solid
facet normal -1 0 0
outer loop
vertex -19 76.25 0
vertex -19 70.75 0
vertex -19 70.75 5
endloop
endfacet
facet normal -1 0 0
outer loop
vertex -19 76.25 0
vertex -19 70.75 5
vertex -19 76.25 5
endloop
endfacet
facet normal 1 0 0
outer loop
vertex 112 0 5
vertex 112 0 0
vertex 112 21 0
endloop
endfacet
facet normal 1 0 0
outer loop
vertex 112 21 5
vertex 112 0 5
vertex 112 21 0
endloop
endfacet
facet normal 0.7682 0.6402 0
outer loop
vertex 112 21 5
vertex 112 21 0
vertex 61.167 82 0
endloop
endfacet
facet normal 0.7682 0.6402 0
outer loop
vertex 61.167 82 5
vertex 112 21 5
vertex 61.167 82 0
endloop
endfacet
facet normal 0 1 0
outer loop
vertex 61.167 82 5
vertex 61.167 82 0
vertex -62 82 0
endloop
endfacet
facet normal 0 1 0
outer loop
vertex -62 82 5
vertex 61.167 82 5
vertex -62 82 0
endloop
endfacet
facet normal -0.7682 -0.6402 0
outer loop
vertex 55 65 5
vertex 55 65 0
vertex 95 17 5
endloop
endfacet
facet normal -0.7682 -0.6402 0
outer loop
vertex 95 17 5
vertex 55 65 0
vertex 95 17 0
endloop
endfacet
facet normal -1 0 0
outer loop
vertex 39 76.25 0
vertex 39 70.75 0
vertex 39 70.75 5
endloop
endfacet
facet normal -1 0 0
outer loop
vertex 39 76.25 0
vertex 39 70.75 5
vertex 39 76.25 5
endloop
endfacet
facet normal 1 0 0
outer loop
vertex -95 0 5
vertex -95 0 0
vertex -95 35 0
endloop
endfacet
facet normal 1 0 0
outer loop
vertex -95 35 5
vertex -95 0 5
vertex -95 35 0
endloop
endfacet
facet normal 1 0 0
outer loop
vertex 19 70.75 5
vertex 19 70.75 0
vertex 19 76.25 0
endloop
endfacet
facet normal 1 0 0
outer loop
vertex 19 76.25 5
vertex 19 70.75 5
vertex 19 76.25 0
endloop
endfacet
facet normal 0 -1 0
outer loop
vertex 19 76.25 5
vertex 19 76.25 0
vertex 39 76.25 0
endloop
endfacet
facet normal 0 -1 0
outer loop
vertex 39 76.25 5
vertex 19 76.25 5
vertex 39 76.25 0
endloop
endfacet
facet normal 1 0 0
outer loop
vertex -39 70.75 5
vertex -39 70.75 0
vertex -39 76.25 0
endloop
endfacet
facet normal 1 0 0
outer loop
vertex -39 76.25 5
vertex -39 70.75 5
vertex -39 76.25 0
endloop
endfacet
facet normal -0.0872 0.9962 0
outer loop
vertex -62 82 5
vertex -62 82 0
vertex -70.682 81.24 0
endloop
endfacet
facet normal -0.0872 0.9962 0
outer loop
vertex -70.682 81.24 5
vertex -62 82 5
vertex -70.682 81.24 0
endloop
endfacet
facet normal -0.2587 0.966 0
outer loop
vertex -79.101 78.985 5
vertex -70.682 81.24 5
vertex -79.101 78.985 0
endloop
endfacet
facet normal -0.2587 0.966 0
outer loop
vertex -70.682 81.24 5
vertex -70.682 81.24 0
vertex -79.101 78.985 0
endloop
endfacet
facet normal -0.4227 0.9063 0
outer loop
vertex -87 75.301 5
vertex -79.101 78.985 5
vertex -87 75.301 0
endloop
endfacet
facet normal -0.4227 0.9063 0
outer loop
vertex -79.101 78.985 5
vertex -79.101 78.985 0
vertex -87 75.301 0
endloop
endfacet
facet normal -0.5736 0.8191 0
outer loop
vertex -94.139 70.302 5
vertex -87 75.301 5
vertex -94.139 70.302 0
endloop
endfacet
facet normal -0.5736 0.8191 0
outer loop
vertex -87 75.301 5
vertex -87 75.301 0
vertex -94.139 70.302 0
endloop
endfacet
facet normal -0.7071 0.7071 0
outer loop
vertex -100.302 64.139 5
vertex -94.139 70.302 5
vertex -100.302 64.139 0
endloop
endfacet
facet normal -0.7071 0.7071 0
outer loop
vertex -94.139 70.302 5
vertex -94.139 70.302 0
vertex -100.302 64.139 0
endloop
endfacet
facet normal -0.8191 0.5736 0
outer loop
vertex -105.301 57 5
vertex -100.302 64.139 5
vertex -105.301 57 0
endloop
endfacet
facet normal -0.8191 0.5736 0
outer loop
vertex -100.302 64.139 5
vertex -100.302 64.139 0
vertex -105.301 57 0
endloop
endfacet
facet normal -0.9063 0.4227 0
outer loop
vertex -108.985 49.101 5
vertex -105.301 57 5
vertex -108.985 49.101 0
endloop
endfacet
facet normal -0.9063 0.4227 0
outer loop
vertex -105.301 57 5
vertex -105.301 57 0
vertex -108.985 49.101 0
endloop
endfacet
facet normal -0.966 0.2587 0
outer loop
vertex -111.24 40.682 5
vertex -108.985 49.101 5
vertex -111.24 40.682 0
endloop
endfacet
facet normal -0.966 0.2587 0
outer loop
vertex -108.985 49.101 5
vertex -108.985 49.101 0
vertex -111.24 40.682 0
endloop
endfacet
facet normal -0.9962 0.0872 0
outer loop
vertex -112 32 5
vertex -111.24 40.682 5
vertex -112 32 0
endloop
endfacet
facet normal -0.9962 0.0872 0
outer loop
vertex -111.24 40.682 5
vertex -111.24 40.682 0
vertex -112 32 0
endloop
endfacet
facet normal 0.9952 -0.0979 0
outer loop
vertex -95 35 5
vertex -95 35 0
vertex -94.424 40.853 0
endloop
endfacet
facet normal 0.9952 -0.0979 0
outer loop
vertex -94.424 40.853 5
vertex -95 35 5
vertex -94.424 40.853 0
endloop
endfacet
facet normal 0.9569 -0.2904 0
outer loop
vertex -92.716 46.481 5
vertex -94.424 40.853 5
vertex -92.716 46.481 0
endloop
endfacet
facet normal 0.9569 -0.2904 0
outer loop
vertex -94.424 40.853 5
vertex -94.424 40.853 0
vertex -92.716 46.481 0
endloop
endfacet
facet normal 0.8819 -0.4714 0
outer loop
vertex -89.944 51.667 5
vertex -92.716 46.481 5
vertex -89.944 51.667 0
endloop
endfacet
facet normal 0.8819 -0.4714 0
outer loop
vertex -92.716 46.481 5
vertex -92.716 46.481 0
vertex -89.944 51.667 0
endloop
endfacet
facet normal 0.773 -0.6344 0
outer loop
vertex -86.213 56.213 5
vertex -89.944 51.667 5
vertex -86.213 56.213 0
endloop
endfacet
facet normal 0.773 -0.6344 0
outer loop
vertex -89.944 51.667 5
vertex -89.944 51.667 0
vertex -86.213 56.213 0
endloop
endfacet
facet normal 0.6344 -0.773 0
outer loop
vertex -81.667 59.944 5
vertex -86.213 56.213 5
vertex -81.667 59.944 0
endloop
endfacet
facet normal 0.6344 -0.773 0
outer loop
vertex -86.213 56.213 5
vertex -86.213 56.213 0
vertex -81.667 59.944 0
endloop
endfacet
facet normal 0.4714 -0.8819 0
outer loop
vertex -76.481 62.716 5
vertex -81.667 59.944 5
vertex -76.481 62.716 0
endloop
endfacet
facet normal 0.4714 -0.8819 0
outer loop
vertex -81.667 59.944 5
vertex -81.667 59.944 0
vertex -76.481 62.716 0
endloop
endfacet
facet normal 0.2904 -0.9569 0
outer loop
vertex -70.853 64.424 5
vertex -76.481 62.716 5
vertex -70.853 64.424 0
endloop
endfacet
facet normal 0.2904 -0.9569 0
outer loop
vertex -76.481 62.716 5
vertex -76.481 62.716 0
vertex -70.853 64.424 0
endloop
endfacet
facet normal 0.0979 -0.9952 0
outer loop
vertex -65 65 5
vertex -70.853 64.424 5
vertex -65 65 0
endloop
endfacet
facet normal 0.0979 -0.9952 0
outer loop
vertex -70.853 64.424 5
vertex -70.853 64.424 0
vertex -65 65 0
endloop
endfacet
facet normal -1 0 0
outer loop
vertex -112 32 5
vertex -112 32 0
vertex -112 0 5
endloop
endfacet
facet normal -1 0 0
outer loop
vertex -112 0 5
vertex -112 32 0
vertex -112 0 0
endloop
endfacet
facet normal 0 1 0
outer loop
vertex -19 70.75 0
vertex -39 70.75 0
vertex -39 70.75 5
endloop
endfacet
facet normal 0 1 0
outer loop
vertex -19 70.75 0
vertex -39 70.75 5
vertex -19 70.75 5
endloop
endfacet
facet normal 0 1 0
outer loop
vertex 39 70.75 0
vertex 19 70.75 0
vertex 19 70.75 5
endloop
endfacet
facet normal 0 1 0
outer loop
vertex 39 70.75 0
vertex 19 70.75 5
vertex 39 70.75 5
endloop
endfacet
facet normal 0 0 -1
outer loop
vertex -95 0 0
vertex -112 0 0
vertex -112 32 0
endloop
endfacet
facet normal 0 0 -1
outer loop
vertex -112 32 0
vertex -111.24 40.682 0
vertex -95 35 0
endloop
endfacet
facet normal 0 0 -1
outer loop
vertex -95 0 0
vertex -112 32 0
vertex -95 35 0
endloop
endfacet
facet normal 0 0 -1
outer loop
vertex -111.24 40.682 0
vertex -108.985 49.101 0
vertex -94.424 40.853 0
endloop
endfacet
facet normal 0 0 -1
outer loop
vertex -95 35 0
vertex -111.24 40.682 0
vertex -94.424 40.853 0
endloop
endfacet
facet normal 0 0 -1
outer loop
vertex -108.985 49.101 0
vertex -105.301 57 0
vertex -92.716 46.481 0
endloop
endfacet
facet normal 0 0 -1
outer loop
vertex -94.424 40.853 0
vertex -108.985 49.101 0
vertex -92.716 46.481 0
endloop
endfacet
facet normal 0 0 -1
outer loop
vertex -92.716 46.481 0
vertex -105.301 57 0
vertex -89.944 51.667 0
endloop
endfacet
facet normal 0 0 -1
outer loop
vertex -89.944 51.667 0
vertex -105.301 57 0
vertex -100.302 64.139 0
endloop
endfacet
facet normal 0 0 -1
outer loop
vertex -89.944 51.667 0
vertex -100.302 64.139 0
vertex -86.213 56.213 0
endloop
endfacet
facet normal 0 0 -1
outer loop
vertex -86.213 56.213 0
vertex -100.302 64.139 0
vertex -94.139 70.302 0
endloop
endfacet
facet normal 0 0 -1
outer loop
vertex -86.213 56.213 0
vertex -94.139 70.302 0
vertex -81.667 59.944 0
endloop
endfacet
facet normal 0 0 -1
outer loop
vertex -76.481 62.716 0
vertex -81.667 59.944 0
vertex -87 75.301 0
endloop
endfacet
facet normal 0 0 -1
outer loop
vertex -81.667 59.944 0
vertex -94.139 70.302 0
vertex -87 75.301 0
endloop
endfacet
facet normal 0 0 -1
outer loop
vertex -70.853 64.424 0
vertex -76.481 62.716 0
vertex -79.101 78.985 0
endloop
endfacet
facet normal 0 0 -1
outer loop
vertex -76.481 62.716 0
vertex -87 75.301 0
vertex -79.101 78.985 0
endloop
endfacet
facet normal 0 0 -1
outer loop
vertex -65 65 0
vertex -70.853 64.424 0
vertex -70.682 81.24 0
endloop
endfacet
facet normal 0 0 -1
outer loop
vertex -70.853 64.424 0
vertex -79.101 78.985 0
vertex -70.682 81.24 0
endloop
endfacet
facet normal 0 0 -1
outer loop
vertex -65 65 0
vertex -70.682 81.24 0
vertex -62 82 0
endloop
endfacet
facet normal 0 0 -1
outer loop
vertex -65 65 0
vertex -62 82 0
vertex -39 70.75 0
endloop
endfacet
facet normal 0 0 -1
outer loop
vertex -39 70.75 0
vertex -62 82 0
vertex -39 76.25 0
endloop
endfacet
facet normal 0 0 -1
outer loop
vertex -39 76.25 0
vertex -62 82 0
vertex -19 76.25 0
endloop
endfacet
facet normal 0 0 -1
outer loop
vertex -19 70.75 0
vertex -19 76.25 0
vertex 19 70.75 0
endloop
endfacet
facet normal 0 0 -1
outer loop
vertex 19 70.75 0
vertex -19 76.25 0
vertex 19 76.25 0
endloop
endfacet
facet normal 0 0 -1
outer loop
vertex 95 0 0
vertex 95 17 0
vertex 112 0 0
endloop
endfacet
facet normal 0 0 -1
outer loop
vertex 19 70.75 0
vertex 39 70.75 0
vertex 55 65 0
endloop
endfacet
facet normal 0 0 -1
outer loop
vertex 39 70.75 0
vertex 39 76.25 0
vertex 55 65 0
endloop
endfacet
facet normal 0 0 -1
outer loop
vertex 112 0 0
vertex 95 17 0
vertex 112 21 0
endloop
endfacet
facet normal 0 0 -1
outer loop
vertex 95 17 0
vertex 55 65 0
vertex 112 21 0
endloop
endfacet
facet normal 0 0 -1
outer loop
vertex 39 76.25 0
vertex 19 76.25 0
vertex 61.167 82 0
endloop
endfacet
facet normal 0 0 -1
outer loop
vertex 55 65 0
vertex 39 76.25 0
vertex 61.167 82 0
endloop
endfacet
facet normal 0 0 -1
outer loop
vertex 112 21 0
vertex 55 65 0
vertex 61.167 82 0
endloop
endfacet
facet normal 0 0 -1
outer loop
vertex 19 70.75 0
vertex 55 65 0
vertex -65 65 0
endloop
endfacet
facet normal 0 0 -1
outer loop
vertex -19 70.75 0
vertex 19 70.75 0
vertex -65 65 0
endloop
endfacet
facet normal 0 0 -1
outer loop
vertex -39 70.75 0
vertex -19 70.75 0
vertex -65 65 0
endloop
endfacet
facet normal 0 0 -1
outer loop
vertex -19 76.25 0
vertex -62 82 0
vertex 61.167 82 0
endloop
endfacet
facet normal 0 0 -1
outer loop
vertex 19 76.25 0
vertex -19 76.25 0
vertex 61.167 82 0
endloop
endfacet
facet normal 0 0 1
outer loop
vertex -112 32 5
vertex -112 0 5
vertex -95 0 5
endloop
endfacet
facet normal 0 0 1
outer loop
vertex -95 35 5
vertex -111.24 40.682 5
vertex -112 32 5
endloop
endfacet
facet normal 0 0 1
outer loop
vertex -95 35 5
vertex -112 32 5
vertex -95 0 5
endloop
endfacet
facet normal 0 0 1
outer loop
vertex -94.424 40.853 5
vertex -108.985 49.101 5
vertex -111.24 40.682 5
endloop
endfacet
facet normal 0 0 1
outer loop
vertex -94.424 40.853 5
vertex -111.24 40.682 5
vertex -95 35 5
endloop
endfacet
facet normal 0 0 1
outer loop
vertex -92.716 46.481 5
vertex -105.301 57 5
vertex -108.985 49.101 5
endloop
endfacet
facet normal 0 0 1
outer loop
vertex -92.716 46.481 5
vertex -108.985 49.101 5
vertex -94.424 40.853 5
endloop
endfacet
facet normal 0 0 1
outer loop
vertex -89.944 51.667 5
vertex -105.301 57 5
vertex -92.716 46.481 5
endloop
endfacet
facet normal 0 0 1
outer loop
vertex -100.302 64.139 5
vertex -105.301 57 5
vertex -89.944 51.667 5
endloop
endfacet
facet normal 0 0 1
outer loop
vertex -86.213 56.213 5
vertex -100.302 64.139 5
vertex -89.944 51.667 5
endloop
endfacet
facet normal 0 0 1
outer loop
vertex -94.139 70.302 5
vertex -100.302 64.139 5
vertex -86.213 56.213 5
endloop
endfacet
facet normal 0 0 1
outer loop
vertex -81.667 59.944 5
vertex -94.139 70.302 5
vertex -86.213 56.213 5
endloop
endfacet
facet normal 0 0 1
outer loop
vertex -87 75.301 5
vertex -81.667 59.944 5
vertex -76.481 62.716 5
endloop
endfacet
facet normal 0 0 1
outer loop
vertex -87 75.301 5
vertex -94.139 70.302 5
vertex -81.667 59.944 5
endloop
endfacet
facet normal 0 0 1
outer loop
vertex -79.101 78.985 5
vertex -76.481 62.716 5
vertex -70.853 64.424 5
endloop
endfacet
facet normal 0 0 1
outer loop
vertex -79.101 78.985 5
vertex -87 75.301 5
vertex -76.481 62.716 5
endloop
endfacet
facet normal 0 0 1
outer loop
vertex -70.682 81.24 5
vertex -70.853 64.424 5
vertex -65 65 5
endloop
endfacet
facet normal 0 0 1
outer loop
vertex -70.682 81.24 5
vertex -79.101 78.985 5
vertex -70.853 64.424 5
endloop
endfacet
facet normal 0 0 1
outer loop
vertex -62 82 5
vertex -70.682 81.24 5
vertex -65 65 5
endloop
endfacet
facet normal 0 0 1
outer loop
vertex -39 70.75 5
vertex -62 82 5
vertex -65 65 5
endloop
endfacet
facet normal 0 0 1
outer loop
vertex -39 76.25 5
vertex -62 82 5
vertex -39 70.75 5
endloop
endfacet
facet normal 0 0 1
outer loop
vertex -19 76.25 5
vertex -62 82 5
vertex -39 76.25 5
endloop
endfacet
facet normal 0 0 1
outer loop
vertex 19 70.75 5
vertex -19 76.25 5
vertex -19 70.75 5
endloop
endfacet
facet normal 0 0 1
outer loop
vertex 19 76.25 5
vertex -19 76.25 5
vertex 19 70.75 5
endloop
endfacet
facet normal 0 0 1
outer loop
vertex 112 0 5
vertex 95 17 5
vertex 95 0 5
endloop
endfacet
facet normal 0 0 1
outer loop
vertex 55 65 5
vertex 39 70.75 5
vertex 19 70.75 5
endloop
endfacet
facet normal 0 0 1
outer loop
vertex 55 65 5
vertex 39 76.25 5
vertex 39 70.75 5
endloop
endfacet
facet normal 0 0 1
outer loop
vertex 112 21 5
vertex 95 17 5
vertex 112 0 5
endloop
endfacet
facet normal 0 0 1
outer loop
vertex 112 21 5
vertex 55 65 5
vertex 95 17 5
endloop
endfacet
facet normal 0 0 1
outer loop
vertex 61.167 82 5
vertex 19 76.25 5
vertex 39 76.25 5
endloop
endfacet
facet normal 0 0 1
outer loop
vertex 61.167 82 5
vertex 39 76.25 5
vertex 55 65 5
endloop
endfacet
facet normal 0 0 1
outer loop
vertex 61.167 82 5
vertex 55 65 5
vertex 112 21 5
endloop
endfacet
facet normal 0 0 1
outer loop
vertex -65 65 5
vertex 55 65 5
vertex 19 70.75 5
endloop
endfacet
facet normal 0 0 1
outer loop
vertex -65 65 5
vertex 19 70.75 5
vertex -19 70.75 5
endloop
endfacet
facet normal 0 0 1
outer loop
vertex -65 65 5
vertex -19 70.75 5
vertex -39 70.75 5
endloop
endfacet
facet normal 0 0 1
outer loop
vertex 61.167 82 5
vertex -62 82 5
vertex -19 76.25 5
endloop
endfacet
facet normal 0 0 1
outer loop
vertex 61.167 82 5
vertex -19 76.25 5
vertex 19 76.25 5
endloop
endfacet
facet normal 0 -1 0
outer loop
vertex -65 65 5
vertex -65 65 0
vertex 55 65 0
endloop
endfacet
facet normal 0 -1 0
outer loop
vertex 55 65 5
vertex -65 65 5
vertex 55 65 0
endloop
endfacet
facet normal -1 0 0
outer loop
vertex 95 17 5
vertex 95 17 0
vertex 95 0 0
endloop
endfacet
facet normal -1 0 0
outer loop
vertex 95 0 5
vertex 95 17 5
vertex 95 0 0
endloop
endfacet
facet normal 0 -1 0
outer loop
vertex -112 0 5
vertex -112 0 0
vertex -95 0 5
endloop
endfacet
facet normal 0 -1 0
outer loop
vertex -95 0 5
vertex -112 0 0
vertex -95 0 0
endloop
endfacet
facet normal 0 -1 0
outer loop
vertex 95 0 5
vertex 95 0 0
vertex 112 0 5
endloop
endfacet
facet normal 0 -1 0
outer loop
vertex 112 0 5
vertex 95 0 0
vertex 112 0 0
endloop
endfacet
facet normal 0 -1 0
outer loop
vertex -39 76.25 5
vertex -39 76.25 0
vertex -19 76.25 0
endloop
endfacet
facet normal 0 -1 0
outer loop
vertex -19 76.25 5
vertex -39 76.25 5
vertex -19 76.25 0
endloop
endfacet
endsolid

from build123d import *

# Parameters (mm, degrees)
SKETCH1_W           = 20
SKETCH1_H           = 5.5
BOSS_EXTRUDE1_DEPTH = 5


with BuildPart() as part:
    # Sketch1 → Boss-Extrude1 (new body)
    with BuildSketch(Plane.XY):
        with BuildLine():
            Line((-112, 0), (-95, 0))
            Line((-95, 0), (-95, 17))
            Line((-95, 17), (-95, 35))
            ThreePointArc((-95, 35), (-86.213203436, 56.213203436), (-65, 65))
            Line((-65, 65), (-55, 65))
            Line((-55, 65), (55, 65))
            Line((55, 65), (95, 17))
            Line((95, 17), (95, 0))
            Line((95, 0), (112, 0))
            Line((112, 0), (112, 21))
            Line((112, 21), (61.166666667, 82))
            Line((61.166666667, 82), (-61.166666667, 82))
            Line((-61.166666667, 82), (-62, 82))
            ThreePointArc((-62, 82), (-97.355339059, 67.355339059), (-112, 32))
            Line((-112, 32), (-112, 21))
            Line((-112, 21), (-112, 0))
        make_face()
        with Locations((29, 73.5)):
            Rectangle(SKETCH1_W, SKETCH1_H, mode=Mode.SUBTRACT)
        with Locations((-29, 73.5)):
            Rectangle(SKETCH1_W, SKETCH1_H, mode=Mode.SUBTRACT)
    extrude(amount=BOSS_EXTRUDE1_DEPTH)


solid = part.part
